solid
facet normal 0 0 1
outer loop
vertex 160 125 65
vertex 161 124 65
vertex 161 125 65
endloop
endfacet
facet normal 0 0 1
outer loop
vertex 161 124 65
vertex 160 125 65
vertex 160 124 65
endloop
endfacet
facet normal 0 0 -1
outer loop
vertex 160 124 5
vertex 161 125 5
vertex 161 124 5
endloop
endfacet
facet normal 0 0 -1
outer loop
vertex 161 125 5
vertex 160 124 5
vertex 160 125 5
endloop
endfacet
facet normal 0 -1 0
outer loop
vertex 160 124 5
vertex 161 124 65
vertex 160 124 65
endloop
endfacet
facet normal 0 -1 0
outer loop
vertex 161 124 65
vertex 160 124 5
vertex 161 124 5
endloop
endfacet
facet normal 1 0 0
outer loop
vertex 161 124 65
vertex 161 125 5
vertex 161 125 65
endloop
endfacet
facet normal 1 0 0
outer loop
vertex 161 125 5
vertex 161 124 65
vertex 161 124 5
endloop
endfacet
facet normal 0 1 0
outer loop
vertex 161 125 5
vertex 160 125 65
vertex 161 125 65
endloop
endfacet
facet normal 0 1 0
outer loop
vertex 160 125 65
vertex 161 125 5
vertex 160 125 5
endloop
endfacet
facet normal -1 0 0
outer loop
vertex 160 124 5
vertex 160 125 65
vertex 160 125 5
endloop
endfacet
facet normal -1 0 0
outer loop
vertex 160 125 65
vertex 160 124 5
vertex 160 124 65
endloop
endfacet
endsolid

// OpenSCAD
// file: simplified_parametric_makerbeam.scad
/*
 * Simplified version of Makerbeam
 * parametric by Meir Michanie (https://www.thingiverse.com/meirm)
 *
 *  Created on: Dec 13, 2014
 *      Author: jotape
 */

file_dxf="MakerBeam.dxf";

demo = 0;
enable_colors = 1;

if (demo) {
    demo();
}

module tslot(model="tslot2", h=10, w=10) {
    scale([0.1*w,0.1*w,1])
       linear_extrude(height=h)import( file=file_dxf, layer=model, $fn=60);
}

module makerbeam_x(h=10, w=10, x=0, y=0, z=0) {
    if (enable_colors) color("red")
    translate([x, y, w+z]) rotate(a=[0, 90, 0]) tslot(h=h, w=w);
}

module makerbeam_y(h=10, w=10, x=0, y=0, z=0){
    if (enable_colors) color("green")
    translate([x, y, w+z]) rotate(a=[-90, 0, 0]) tslot(h=h, w=w);
}

module makerbeam_z(h=10, w=10, x=0, y=0, z=0){
    if (enable_colors) color("blue")
    translate ([x, y, z]) tslot(h=h, w=w);
}


module demo() {
    makerbeam_x(100, 10, 10, 0, 0);
    makerbeam_x(100, 10, 10, 110, 0);
    makerbeam_x(100, 10, 10, 110, 90);
    makerbeam_x(100, 10, 10, 0, 90);

    makerbeam_y(100, 10, 110, 10, 0);
    makerbeam_y(100, 10, 110, 10, 90);
    makerbeam_y(100, 10, 0, 10, 0);
    makerbeam_y(100, 10, 0, 10, 90);

    makerbeam_z(100, 10, 0, 0, 0);
    makerbeam_z(100, 10, 0, 110, 0);
    makerbeam_z(100, 10, 110, 110, 0);
    makerbeam_z(100, 10, 110, 0, 0);
}
// main file
/*
 * Makerbeam Foam Cutter
 * It requires: http://www.thingiverse.com/thing:590893
 *
 *  Created on: Dec 13, 2014
 *      Author: jotape
 */

include <simplified_parametric_makerbeam.scad>;

show_foam = 0;
show_nichrome_wire = 1;

module nichrome_wire (length, x, y, z) {
	color ("black") translate(v=[x, y, z]) cube (size=[1, 1, length]);
}

makerbeam_x(200, 10, 0, 0, 0);
makerbeam_x(200, 10, 0, 160, 0);
makerbeam_x(200, 10, 10, 125, 60);

makerbeam_y(150, 10, 0, 10, 0);
makerbeam_y(150, 10, 0, 10, 10);
makerbeam_y(150, 10, 150, 10, 0);
makerbeam_y(150, 10, 30, 10, 0);
makerbeam_y(150, 10, 0, 10, 60);

makerbeam_z(60, 10, 0, 0, 10);
makerbeam_z(60, 10, 0, 160, 10);

if (show_foam) {
    color ("orange") {
        translate(v=[10, -(22+125)+($t*100), 10]) cube (size=[210, 297, 30]);
    }
    
    color ("red") {
        translate(v=[10, 125-125+($t*100), 10]) cube (size=[150, 150, 31]);
    }
}

if (show_nichrome_wire) {
    nichrome_wire (60, 160, 125-1, 5);
}
